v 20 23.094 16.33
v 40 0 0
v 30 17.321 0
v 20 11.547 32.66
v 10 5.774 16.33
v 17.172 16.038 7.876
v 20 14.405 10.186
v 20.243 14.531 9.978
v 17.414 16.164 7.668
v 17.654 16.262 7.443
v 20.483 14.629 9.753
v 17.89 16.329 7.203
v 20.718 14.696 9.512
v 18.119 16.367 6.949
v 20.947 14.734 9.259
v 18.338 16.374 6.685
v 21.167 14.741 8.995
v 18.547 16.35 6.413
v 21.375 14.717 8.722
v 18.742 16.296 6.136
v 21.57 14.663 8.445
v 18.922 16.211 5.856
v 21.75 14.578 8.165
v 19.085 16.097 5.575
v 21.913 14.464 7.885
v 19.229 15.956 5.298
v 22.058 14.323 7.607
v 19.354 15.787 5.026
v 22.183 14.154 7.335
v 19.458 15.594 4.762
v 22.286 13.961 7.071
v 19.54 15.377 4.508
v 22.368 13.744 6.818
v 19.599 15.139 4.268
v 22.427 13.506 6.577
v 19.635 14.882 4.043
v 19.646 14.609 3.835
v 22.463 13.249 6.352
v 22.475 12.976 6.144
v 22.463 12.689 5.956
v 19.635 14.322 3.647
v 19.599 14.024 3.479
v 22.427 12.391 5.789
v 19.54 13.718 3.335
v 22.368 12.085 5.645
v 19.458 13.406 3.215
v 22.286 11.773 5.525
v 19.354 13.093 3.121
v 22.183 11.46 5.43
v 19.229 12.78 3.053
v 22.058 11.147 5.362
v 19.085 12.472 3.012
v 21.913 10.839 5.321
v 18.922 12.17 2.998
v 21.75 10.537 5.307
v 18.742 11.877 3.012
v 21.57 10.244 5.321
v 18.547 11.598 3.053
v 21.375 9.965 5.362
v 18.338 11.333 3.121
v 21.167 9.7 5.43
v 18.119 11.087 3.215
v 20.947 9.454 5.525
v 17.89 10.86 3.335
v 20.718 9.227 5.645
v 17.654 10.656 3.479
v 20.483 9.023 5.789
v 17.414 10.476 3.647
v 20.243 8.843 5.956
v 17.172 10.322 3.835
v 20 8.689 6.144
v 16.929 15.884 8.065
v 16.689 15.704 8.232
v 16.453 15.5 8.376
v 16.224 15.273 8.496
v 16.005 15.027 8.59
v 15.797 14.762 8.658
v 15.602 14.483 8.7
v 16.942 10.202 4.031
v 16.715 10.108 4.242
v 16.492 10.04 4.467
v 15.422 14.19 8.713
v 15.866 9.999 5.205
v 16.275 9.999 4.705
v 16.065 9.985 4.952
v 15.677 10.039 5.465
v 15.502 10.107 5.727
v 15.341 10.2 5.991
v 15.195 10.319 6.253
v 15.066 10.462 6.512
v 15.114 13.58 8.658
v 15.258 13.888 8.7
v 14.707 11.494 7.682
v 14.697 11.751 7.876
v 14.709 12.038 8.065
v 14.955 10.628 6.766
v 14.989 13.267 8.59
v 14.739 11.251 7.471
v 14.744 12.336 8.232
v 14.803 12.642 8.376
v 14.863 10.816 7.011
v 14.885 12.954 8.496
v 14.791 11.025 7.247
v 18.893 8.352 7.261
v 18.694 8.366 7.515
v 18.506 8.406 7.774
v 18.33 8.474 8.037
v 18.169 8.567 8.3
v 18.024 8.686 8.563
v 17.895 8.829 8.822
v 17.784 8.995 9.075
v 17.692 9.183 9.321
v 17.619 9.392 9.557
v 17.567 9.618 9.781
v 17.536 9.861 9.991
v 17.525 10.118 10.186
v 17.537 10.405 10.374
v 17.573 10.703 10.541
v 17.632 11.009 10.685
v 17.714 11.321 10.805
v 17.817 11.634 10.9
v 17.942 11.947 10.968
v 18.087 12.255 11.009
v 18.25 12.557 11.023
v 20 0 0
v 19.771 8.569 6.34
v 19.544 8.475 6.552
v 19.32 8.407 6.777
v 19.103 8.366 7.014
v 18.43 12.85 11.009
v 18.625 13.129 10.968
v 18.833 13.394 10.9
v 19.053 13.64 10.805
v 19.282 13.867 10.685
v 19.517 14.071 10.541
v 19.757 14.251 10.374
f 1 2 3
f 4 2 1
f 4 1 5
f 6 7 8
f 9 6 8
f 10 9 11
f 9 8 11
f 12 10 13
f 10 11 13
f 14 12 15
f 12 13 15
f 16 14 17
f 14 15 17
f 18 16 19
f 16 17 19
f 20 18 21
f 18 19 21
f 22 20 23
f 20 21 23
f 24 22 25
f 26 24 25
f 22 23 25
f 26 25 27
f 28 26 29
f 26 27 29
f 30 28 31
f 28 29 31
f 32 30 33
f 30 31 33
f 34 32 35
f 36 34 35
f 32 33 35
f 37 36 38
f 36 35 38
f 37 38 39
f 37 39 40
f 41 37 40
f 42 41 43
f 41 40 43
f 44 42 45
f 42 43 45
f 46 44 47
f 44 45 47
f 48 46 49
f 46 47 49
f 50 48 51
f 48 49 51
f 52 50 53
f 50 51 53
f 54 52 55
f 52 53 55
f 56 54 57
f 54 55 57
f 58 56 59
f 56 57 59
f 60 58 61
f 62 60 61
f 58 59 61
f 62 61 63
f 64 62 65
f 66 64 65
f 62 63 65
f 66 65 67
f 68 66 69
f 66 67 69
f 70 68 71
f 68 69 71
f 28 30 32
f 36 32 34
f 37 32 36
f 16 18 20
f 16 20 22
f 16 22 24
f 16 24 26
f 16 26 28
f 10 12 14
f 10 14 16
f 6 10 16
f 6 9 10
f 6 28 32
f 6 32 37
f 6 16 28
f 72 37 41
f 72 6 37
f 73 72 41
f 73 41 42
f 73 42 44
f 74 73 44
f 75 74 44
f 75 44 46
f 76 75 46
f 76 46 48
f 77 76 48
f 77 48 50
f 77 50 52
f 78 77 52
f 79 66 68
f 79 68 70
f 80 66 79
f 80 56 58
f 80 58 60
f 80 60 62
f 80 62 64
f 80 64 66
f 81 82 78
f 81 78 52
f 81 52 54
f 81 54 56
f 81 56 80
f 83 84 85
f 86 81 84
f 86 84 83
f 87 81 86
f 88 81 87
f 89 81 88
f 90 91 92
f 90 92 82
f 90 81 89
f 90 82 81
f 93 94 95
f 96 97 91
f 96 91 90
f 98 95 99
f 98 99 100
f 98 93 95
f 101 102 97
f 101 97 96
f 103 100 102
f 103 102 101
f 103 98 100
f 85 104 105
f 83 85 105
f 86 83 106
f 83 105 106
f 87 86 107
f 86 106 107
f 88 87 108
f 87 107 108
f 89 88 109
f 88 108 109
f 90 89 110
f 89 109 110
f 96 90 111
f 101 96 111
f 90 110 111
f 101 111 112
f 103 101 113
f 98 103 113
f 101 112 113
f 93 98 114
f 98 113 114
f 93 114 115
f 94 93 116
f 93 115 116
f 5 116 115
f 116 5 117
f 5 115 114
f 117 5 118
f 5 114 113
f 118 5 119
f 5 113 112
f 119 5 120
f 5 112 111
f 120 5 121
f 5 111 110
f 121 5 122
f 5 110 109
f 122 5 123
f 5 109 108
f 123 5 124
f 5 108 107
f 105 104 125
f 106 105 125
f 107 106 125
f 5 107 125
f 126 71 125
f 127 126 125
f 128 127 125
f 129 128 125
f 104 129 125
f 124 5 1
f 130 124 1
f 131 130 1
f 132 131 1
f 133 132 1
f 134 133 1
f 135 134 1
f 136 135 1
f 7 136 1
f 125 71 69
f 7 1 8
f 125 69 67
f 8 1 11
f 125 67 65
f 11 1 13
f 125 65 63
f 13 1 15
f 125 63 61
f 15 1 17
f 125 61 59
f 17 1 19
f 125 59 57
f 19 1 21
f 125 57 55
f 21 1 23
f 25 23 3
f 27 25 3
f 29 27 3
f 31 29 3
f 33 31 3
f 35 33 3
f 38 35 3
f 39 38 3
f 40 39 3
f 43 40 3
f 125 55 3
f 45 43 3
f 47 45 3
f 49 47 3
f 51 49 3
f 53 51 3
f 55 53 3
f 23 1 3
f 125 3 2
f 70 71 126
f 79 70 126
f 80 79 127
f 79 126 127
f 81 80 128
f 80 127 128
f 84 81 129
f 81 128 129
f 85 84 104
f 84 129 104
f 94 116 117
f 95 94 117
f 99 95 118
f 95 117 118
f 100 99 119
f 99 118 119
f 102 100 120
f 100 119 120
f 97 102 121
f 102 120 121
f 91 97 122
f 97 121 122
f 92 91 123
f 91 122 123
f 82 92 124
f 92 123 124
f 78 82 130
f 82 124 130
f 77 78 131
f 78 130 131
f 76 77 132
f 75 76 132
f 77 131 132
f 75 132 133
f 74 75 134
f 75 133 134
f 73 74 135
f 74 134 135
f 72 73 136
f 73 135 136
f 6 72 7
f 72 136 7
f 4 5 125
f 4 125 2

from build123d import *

# Parameters (mm, degrees)
F7_DEPTH = 4


with BuildPart() as f3:
    # F0 (on Top) → F3 section 0
    with BuildSketch(Plane.XY, mode=Mode.PRIVATE) as f3_s0:
        Polygon((20, 34.6410161514), (0, 0), (40, 0), align=None)
    loft([f3_s0.sketch, Vertex(20, 11.5470053838, 32.6598632371)])

    # F5: sweep along a path in F5_path
    with BuildLine(Plane(origin=(0, 0, 0), x_dir=(-0.5, -0.8660254038, 0), z_dir=(0.8660254038, -0.5, 0))) as f5_path:
        Line((0, 0), (-40, 0))
    # F4 (on face) → F5 (sweep, cut)
    with BuildSketch(Plane(origin=(26.6666666667, 15.3960071784, 10.886621079), x_dir=(-0.4364357805, 0.8819171037, -0.1781741613), z_dir=(0.8164965809, 0.4714045208, 0.3333333333))):
        Polygon((2.1821789024, -11.3389341903), (21.8217890236, -7.5592894602), (8.7287156094, 7.5592894602), align=None)
    sweep(path=f5_path.line, mode=Mode.SUBTRACT)

    # F6 (on face) → F7 (join)
    with BuildSketch(Plane(origin=(10, -5.7735026919, 8.1649658093), x_dir=(-0.316227766, -0.9128709292, -0.2581988897), z_dir=(-0.7071067812, 0.4082482905, -0.5773502692))):
        with BuildLine():
            ThreePointArc((-17.4084183768, -3.1940601518), (-20.0804631421, -3.0041637772), (-22.1041611295, -4.7593077361))
            Line((-22.1041611295, -4.7593077361), (-18.973665961, -6.3245553203))
            Line((-18.973665961, -6.3245553203), (-17.4084183768, -3.1940601518))
        make_face()
        with BuildLine():
            Line((-17.4084183768, -3.1940601518), (-18.973665961, -6.3245553203))
            Line((-18.973665961, -6.3245553203), (-15.8431707925, -7.8898029046))
            ThreePointArc((-15.8431707925, -7.8898029046), (-15.5672944979, -7.1286905423), (-15.473665961, -6.3245553203))
            ThreePointArc((-15.473665961, -6.3245553203), (-15.9963881318, -4.4844964279), (-17.4084183768, -3.1940601518))
        make_face()
        with BuildLine():
            Line((-18.973665961, -6.3245553203), (-22.1041611295, -4.7593077361))
            ThreePointArc((-22.1041611295, -4.7593077361), (-22.2940575042, -7.4313525014), (-20.5389135453, -9.4550504888))
            Line((-20.5389135453, -9.4550504888), (-18.973665961, -6.3245553203))
        make_face()
        with BuildLine():
            Line((-15.8431707925, -7.8898029046), (-18.973665961, -6.3245553203))
            Line((-18.973665961, -6.3245553203), (-20.5389135453, -9.4550504888))
            ThreePointArc((-20.5389135453, -9.4550504888), (-17.86686878, -9.6449468635), (-15.8431707925, -7.8898029046))
        make_face()
    extrude(amount=F7_DEPTH)


solid = f3.part
